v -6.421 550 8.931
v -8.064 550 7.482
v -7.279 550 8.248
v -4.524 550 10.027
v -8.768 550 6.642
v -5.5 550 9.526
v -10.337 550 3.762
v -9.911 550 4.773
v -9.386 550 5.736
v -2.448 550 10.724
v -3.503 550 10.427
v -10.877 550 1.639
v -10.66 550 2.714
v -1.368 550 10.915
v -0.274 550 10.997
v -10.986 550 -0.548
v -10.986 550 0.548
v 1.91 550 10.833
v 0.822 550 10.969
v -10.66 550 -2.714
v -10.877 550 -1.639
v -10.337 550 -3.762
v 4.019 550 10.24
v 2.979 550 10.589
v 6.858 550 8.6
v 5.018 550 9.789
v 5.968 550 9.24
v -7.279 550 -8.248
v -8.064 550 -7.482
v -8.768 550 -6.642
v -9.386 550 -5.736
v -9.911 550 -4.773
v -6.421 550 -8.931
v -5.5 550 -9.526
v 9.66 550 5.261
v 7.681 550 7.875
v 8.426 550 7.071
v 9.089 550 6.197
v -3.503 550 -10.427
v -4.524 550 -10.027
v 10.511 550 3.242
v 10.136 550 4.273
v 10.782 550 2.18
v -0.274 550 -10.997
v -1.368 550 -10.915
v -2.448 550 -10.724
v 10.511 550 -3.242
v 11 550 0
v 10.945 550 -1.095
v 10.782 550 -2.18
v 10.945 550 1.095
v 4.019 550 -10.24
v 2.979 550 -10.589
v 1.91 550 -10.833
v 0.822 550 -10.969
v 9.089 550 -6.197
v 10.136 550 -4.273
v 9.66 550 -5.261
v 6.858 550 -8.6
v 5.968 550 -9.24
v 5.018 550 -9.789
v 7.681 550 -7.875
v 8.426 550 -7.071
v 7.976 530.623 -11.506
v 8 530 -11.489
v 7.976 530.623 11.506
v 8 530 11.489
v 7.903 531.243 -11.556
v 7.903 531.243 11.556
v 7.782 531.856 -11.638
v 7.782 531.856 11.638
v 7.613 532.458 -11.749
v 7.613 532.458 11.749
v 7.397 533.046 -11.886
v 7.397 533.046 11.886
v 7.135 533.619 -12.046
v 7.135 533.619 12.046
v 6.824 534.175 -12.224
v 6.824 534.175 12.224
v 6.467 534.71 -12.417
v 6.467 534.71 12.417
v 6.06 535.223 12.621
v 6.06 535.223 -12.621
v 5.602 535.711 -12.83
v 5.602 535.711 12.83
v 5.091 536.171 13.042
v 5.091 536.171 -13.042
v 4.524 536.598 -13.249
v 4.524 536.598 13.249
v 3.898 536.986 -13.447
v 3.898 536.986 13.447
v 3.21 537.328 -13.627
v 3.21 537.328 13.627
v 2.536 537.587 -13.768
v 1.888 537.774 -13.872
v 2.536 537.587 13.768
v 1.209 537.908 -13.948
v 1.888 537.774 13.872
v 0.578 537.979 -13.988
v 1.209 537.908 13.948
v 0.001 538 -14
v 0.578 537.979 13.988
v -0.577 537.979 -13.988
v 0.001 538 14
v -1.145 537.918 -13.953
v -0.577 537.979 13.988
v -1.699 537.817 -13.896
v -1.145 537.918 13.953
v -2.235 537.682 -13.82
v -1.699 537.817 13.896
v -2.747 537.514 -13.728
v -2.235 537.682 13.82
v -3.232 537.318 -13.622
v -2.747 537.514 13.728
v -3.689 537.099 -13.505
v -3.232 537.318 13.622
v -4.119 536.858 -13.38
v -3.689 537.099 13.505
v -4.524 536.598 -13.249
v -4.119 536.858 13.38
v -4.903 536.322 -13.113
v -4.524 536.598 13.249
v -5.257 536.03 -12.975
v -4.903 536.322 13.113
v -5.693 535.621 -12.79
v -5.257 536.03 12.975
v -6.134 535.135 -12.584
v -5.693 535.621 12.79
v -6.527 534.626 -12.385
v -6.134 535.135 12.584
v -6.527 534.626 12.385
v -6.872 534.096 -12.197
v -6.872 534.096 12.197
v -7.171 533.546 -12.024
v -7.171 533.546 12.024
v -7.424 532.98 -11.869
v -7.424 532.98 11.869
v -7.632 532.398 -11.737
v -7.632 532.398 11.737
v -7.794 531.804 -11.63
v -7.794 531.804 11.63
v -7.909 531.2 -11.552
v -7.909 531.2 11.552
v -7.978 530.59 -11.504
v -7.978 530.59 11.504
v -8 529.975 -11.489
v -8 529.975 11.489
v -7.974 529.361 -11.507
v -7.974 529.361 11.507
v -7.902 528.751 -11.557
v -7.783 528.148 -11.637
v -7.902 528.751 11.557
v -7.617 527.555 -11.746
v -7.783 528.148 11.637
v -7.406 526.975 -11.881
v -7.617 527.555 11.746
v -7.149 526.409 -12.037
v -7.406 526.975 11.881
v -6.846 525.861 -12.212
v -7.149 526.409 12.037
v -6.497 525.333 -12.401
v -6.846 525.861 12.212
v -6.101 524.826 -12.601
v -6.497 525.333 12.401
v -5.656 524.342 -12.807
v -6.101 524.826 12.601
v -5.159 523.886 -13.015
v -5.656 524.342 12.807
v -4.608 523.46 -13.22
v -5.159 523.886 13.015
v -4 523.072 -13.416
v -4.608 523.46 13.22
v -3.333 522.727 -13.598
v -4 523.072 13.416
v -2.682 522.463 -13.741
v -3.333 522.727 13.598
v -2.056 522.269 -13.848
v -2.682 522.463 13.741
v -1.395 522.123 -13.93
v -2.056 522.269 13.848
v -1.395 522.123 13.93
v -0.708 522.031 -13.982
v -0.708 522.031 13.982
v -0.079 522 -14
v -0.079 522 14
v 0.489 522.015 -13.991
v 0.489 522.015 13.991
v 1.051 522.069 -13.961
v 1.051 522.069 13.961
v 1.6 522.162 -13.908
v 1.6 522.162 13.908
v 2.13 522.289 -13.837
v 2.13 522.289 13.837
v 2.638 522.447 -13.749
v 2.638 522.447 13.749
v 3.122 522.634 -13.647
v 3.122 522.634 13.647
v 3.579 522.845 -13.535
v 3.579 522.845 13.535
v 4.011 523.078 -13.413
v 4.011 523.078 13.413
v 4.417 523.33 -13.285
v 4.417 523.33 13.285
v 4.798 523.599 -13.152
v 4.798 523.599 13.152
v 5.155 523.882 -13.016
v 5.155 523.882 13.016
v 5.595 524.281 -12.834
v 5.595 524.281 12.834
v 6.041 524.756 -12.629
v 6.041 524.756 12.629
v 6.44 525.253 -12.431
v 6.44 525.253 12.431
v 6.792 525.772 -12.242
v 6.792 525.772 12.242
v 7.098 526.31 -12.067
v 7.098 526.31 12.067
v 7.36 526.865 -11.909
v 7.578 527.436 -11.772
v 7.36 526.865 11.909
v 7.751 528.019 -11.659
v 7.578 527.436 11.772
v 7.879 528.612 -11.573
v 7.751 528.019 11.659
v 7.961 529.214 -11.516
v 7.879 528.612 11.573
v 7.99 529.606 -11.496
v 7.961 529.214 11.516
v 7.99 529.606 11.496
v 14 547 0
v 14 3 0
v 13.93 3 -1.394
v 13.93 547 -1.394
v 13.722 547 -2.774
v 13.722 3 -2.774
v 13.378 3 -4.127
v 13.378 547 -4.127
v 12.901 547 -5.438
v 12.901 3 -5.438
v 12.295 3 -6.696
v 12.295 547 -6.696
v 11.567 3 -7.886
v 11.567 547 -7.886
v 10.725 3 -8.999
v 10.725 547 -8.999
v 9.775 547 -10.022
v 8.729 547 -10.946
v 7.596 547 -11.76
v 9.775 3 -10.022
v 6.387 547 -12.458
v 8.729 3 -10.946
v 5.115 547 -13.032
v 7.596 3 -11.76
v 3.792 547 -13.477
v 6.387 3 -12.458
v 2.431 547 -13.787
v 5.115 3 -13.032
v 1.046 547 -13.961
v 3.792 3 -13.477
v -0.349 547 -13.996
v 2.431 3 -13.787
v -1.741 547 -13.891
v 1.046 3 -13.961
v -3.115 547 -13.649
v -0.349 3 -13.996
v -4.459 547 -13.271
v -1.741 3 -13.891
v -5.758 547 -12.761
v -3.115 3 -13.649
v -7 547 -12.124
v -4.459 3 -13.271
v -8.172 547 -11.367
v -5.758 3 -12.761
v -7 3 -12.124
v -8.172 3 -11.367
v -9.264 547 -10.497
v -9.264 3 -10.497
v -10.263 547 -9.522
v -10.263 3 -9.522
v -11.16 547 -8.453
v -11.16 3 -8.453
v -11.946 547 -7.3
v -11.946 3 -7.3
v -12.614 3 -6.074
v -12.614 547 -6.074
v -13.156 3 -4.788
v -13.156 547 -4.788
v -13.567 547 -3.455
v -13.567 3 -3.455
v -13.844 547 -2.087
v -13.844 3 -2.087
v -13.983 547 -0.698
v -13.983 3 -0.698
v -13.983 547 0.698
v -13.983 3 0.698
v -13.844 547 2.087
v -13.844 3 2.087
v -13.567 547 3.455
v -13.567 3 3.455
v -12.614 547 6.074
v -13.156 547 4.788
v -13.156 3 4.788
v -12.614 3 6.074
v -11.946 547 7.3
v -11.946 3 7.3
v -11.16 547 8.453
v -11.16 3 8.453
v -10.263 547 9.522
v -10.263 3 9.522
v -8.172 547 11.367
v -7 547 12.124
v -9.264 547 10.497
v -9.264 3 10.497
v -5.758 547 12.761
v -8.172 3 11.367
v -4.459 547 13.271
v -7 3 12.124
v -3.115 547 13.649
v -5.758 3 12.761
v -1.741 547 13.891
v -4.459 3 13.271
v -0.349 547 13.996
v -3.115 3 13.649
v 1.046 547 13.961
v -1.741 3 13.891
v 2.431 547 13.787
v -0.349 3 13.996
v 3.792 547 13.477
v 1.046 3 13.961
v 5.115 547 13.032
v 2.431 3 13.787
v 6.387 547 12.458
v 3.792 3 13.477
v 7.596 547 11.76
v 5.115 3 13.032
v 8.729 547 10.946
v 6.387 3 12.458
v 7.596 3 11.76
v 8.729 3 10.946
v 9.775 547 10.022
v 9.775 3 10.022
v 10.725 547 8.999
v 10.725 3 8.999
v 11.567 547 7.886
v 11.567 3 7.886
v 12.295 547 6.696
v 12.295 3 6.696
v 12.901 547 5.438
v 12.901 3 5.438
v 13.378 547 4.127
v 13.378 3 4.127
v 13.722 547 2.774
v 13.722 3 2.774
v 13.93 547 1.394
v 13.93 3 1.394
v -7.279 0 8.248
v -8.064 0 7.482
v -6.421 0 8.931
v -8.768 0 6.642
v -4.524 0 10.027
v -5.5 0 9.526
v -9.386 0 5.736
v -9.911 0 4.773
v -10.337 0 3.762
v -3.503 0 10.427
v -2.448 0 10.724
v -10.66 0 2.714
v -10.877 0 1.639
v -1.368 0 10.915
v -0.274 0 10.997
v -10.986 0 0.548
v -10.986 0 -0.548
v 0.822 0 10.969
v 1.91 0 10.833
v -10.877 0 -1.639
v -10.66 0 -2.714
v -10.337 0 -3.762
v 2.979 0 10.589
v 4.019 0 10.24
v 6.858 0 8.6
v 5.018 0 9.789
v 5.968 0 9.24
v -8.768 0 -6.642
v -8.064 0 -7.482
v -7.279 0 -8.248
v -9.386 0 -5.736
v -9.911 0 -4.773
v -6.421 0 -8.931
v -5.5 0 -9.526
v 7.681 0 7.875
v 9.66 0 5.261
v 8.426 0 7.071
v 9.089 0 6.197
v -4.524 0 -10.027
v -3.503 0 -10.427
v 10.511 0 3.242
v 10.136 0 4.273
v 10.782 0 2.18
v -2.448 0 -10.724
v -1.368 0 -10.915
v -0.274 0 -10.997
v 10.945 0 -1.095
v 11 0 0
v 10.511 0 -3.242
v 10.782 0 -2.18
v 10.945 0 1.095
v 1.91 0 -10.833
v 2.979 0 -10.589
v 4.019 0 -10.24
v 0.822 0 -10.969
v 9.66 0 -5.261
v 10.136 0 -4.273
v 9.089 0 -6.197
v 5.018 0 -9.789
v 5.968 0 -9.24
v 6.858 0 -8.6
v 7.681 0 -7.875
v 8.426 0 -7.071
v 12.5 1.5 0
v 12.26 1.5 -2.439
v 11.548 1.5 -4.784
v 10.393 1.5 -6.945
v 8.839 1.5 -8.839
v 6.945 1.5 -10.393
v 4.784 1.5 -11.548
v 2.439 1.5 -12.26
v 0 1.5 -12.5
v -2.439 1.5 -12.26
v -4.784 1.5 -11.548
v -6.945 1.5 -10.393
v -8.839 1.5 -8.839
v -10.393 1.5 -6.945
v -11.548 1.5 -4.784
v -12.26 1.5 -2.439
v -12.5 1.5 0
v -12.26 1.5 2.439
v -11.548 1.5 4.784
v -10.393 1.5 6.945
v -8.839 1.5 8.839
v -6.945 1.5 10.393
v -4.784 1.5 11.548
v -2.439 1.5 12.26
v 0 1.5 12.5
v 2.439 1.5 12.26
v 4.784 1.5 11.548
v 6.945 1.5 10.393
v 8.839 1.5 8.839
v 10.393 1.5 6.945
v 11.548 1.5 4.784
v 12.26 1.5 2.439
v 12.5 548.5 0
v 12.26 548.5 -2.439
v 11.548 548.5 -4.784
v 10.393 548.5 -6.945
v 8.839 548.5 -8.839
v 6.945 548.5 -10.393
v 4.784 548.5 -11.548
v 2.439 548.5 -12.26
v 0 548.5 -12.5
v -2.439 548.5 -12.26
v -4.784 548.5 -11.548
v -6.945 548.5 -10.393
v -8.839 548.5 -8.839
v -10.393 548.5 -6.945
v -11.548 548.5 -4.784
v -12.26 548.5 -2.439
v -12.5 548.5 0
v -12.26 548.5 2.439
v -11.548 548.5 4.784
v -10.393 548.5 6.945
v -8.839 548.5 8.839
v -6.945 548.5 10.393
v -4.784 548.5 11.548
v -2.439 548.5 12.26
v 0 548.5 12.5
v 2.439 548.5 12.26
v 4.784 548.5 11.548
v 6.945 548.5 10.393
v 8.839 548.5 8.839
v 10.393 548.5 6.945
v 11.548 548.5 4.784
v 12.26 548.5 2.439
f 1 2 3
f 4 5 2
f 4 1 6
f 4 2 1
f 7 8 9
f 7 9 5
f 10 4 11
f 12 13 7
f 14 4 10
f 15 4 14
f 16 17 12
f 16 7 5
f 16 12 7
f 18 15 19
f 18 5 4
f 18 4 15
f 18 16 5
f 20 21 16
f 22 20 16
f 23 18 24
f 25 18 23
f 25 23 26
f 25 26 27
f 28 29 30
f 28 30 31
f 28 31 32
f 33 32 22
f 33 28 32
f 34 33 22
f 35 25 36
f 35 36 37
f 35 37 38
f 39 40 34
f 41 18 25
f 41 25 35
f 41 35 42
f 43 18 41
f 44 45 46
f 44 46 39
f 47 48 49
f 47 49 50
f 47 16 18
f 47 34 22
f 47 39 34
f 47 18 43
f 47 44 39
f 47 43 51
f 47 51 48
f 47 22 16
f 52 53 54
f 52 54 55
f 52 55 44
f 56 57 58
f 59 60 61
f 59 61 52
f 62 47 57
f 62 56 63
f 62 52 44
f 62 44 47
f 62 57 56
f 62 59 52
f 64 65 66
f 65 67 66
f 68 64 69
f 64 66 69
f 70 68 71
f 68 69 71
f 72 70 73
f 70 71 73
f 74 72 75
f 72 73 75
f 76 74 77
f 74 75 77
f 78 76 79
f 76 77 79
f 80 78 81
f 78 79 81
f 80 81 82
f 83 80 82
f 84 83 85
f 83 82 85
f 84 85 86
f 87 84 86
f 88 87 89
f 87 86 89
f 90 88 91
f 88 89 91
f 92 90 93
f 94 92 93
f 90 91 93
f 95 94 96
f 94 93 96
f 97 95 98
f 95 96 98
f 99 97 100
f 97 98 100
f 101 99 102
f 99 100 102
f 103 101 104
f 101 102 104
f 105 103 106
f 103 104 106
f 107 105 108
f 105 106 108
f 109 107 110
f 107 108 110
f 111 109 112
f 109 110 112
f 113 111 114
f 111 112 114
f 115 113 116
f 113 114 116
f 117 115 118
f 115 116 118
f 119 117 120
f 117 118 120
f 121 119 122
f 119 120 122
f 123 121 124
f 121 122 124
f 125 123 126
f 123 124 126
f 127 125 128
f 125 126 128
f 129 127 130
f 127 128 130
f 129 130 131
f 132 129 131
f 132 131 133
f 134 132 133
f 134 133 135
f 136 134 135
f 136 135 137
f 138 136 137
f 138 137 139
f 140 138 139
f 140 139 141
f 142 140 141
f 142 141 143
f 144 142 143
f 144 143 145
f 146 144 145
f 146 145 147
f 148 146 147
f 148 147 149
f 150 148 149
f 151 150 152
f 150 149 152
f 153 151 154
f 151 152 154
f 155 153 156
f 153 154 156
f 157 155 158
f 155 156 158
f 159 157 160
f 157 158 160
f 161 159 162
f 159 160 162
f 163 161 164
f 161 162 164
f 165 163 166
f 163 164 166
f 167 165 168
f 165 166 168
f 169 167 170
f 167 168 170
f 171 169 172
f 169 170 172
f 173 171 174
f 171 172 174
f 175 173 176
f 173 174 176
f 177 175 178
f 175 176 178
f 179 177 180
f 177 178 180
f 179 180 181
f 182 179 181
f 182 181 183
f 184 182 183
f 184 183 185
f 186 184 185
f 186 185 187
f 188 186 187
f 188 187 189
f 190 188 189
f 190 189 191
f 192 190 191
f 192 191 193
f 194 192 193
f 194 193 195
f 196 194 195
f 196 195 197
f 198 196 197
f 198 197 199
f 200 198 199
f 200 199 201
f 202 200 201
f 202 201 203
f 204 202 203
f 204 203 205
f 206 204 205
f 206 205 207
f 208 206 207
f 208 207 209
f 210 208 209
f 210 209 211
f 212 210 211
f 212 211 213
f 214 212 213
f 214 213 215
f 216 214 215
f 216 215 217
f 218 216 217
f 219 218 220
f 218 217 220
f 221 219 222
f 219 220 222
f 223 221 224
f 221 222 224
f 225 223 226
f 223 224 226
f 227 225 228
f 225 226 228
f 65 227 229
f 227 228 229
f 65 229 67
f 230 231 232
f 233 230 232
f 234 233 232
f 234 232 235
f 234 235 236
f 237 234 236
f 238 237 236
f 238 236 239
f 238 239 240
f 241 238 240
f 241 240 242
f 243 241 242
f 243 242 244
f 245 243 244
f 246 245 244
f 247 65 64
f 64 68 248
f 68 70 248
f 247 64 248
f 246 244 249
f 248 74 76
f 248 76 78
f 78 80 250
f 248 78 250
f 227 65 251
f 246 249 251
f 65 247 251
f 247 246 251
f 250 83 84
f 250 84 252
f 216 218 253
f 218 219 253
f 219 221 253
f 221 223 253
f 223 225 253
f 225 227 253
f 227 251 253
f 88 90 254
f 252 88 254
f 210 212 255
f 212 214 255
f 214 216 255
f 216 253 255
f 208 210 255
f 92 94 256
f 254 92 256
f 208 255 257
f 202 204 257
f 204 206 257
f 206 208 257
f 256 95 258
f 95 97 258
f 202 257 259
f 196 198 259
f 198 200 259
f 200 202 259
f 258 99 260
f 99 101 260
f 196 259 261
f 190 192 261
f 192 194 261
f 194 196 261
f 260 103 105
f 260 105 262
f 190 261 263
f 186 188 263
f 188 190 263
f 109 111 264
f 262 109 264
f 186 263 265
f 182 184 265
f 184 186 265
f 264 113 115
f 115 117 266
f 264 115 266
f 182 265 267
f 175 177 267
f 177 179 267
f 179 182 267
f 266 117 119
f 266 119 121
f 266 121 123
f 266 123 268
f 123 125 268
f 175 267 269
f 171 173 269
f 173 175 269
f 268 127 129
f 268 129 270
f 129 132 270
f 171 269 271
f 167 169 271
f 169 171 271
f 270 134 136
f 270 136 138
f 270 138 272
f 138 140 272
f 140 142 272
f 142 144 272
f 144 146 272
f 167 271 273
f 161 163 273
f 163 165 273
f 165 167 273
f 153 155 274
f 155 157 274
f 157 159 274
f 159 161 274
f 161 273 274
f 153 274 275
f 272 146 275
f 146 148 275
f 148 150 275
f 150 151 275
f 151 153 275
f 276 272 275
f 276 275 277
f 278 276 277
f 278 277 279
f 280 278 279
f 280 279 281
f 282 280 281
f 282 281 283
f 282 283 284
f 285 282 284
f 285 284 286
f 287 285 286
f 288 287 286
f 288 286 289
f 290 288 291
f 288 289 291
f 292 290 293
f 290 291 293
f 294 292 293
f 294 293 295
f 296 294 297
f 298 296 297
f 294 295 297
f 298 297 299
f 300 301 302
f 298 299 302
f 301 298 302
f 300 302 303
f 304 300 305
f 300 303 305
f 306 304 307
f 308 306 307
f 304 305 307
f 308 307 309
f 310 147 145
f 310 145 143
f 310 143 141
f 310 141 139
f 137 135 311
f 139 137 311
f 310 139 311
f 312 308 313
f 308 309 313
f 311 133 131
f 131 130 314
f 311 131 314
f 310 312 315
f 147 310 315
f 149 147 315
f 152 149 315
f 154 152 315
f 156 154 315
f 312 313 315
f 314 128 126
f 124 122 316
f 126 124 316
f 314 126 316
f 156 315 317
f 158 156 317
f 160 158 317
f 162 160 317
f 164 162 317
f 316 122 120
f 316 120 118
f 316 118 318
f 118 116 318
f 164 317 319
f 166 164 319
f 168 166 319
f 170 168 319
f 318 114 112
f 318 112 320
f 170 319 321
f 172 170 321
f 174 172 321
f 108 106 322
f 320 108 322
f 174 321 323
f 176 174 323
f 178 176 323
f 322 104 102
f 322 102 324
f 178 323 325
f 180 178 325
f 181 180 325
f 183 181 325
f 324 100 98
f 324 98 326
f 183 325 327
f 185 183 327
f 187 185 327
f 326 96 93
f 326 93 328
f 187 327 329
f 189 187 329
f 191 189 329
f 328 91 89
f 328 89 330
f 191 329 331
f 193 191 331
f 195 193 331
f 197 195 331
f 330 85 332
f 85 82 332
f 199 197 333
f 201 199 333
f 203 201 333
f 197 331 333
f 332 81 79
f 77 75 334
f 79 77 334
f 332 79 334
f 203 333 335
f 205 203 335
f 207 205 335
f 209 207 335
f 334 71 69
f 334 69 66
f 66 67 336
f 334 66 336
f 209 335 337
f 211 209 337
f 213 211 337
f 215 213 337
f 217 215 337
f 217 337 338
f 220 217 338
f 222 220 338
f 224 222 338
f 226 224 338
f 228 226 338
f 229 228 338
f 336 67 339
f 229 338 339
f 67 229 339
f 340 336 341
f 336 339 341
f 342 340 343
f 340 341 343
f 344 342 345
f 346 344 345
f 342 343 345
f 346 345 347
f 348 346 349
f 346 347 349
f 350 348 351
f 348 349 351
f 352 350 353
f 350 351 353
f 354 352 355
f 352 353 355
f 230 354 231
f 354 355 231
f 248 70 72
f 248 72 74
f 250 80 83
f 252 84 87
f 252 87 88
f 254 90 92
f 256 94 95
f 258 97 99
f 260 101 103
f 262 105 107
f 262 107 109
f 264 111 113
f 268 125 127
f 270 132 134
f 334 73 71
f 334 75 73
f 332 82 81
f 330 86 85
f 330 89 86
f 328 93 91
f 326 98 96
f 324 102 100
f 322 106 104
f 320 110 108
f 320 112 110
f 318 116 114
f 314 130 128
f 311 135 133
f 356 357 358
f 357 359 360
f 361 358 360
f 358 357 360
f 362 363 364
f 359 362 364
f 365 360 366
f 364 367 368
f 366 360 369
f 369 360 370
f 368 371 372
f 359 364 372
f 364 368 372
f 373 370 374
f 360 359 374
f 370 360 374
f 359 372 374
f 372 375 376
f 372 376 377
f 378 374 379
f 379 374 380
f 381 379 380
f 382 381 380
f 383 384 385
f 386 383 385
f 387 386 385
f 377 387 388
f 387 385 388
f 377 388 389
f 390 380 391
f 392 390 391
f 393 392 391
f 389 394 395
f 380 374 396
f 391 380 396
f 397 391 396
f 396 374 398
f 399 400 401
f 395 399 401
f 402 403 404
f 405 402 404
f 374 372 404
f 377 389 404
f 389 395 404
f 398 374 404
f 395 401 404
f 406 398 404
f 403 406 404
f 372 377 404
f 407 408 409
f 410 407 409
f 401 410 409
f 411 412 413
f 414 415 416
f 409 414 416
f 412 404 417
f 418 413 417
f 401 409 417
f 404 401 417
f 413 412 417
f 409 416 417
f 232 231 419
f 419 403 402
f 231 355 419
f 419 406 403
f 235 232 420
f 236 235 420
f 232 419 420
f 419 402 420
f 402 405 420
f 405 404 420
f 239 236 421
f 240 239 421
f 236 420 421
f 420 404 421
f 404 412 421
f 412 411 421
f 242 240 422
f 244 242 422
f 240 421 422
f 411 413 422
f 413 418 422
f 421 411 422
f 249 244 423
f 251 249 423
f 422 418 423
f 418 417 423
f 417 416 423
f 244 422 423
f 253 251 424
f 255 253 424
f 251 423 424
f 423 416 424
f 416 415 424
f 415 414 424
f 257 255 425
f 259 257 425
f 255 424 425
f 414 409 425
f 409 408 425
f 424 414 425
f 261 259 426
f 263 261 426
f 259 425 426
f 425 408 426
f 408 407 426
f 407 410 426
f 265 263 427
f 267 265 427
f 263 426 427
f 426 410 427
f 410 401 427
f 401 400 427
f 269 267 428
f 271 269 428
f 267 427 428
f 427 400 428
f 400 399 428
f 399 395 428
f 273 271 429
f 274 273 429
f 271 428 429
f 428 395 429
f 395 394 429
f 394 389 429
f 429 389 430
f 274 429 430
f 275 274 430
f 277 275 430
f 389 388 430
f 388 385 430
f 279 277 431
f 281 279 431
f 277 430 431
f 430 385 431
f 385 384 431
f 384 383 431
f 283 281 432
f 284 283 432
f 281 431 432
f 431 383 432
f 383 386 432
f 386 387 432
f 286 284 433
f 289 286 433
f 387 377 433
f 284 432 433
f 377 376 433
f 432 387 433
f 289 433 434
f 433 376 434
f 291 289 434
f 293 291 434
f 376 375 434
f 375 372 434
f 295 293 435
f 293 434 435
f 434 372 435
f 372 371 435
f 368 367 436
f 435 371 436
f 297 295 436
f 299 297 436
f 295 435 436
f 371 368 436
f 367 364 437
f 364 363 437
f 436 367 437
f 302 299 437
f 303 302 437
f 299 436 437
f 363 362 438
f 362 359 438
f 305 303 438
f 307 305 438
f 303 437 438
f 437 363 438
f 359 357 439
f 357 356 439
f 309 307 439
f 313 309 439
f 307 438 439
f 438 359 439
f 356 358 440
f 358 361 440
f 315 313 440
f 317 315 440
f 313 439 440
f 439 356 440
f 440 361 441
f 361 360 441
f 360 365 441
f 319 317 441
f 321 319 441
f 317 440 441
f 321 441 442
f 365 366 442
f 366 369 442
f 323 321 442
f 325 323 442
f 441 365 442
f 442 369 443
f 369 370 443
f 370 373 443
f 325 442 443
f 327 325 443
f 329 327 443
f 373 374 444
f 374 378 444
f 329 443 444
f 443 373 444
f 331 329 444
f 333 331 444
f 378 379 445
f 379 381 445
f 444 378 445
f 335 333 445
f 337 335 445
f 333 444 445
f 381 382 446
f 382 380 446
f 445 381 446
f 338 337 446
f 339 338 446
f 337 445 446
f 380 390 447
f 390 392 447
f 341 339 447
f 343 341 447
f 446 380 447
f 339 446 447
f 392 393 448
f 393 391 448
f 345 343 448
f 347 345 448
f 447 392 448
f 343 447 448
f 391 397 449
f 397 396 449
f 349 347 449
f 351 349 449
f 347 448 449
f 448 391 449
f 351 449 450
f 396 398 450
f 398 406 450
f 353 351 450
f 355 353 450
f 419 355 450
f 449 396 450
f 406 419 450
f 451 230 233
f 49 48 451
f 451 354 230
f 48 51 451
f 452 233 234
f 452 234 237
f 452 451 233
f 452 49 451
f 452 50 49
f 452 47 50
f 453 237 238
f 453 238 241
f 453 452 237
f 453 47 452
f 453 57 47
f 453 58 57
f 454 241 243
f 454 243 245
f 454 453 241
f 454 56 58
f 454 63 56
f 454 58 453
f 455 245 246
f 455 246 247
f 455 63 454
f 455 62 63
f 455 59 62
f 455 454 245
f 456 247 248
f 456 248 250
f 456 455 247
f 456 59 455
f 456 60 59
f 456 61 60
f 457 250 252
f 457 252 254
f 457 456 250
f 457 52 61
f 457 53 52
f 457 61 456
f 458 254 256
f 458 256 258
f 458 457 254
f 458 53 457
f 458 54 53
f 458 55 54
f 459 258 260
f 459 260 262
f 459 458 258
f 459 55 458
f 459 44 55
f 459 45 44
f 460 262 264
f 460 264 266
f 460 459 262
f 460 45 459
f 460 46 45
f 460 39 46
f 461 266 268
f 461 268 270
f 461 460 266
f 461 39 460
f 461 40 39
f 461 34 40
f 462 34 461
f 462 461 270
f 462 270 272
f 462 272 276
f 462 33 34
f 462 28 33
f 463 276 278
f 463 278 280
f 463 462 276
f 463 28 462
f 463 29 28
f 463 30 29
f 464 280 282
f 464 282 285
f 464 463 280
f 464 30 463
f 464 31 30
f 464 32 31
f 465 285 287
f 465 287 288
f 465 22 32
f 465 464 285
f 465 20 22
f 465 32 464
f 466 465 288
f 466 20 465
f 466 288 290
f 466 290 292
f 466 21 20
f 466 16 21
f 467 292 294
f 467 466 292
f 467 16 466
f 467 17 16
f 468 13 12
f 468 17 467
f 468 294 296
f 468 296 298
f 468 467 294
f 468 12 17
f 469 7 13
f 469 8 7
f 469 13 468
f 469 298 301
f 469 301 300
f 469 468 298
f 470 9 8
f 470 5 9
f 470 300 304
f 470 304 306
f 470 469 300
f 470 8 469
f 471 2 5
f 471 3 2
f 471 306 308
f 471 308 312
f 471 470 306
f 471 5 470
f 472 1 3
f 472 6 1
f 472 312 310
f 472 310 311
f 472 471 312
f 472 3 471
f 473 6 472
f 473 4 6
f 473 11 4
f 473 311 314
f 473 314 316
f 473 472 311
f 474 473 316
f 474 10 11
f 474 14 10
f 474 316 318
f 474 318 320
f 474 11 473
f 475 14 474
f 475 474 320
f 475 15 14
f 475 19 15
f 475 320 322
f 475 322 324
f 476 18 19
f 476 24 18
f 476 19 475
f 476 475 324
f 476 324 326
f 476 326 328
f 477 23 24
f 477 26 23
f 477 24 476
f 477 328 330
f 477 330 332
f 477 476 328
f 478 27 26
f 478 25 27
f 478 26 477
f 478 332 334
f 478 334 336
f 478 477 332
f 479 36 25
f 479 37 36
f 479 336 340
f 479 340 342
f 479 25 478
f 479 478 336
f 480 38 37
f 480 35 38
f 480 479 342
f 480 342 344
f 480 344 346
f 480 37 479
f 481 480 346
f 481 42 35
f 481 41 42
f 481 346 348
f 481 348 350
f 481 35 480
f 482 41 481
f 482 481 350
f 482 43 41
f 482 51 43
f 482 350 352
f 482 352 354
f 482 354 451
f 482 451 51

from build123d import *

# Parameters (mm, degrees)
SKETCH1_R               = 14
BOSS_EXTRUDE1_DEPTH     = 550
SKETCH2_R               = 8
CUT_EXTRUDE1_DEPTH      = 15
CUT_EXTRUDE1_DEPTH_BACK = 15
CHAMFER1_SIZE           = 3


with BuildPart() as part:
    # Sketch1 → Boss-Extrude1 (new body)
    with BuildSketch(Plane(origin=(0, 0, 0), x_dir=(1, 0, 0), z_dir=(0, 1, 0))):
        Circle(SKETCH1_R)
    extrude(amount=BOSS_EXTRUDE1_DEPTH)

    # Sketch2 → Cut-Extrude1 (cut, two sides)
    with BuildSketch(Plane.XY) as cut_extrude1_sk:
        with Locations((0, 530)):
            Circle(SKETCH2_R)
    extrude(amount=CUT_EXTRUDE1_DEPTH, mode=Mode.SUBTRACT)
    extrude(cut_extrude1_sk.sketch, amount=-CUT_EXTRUDE1_DEPTH_BACK, mode=Mode.SUBTRACT)

    # Chamfer1
    chamfer1_edges = [part.edges().sort_by_distance(p)[0] for p in [
        (-14, 0, 0),
        (-14, 550, 0),
    ]]
    chamfer(chamfer1_edges, length=CHAMFER1_SIZE)


solid = part.part
